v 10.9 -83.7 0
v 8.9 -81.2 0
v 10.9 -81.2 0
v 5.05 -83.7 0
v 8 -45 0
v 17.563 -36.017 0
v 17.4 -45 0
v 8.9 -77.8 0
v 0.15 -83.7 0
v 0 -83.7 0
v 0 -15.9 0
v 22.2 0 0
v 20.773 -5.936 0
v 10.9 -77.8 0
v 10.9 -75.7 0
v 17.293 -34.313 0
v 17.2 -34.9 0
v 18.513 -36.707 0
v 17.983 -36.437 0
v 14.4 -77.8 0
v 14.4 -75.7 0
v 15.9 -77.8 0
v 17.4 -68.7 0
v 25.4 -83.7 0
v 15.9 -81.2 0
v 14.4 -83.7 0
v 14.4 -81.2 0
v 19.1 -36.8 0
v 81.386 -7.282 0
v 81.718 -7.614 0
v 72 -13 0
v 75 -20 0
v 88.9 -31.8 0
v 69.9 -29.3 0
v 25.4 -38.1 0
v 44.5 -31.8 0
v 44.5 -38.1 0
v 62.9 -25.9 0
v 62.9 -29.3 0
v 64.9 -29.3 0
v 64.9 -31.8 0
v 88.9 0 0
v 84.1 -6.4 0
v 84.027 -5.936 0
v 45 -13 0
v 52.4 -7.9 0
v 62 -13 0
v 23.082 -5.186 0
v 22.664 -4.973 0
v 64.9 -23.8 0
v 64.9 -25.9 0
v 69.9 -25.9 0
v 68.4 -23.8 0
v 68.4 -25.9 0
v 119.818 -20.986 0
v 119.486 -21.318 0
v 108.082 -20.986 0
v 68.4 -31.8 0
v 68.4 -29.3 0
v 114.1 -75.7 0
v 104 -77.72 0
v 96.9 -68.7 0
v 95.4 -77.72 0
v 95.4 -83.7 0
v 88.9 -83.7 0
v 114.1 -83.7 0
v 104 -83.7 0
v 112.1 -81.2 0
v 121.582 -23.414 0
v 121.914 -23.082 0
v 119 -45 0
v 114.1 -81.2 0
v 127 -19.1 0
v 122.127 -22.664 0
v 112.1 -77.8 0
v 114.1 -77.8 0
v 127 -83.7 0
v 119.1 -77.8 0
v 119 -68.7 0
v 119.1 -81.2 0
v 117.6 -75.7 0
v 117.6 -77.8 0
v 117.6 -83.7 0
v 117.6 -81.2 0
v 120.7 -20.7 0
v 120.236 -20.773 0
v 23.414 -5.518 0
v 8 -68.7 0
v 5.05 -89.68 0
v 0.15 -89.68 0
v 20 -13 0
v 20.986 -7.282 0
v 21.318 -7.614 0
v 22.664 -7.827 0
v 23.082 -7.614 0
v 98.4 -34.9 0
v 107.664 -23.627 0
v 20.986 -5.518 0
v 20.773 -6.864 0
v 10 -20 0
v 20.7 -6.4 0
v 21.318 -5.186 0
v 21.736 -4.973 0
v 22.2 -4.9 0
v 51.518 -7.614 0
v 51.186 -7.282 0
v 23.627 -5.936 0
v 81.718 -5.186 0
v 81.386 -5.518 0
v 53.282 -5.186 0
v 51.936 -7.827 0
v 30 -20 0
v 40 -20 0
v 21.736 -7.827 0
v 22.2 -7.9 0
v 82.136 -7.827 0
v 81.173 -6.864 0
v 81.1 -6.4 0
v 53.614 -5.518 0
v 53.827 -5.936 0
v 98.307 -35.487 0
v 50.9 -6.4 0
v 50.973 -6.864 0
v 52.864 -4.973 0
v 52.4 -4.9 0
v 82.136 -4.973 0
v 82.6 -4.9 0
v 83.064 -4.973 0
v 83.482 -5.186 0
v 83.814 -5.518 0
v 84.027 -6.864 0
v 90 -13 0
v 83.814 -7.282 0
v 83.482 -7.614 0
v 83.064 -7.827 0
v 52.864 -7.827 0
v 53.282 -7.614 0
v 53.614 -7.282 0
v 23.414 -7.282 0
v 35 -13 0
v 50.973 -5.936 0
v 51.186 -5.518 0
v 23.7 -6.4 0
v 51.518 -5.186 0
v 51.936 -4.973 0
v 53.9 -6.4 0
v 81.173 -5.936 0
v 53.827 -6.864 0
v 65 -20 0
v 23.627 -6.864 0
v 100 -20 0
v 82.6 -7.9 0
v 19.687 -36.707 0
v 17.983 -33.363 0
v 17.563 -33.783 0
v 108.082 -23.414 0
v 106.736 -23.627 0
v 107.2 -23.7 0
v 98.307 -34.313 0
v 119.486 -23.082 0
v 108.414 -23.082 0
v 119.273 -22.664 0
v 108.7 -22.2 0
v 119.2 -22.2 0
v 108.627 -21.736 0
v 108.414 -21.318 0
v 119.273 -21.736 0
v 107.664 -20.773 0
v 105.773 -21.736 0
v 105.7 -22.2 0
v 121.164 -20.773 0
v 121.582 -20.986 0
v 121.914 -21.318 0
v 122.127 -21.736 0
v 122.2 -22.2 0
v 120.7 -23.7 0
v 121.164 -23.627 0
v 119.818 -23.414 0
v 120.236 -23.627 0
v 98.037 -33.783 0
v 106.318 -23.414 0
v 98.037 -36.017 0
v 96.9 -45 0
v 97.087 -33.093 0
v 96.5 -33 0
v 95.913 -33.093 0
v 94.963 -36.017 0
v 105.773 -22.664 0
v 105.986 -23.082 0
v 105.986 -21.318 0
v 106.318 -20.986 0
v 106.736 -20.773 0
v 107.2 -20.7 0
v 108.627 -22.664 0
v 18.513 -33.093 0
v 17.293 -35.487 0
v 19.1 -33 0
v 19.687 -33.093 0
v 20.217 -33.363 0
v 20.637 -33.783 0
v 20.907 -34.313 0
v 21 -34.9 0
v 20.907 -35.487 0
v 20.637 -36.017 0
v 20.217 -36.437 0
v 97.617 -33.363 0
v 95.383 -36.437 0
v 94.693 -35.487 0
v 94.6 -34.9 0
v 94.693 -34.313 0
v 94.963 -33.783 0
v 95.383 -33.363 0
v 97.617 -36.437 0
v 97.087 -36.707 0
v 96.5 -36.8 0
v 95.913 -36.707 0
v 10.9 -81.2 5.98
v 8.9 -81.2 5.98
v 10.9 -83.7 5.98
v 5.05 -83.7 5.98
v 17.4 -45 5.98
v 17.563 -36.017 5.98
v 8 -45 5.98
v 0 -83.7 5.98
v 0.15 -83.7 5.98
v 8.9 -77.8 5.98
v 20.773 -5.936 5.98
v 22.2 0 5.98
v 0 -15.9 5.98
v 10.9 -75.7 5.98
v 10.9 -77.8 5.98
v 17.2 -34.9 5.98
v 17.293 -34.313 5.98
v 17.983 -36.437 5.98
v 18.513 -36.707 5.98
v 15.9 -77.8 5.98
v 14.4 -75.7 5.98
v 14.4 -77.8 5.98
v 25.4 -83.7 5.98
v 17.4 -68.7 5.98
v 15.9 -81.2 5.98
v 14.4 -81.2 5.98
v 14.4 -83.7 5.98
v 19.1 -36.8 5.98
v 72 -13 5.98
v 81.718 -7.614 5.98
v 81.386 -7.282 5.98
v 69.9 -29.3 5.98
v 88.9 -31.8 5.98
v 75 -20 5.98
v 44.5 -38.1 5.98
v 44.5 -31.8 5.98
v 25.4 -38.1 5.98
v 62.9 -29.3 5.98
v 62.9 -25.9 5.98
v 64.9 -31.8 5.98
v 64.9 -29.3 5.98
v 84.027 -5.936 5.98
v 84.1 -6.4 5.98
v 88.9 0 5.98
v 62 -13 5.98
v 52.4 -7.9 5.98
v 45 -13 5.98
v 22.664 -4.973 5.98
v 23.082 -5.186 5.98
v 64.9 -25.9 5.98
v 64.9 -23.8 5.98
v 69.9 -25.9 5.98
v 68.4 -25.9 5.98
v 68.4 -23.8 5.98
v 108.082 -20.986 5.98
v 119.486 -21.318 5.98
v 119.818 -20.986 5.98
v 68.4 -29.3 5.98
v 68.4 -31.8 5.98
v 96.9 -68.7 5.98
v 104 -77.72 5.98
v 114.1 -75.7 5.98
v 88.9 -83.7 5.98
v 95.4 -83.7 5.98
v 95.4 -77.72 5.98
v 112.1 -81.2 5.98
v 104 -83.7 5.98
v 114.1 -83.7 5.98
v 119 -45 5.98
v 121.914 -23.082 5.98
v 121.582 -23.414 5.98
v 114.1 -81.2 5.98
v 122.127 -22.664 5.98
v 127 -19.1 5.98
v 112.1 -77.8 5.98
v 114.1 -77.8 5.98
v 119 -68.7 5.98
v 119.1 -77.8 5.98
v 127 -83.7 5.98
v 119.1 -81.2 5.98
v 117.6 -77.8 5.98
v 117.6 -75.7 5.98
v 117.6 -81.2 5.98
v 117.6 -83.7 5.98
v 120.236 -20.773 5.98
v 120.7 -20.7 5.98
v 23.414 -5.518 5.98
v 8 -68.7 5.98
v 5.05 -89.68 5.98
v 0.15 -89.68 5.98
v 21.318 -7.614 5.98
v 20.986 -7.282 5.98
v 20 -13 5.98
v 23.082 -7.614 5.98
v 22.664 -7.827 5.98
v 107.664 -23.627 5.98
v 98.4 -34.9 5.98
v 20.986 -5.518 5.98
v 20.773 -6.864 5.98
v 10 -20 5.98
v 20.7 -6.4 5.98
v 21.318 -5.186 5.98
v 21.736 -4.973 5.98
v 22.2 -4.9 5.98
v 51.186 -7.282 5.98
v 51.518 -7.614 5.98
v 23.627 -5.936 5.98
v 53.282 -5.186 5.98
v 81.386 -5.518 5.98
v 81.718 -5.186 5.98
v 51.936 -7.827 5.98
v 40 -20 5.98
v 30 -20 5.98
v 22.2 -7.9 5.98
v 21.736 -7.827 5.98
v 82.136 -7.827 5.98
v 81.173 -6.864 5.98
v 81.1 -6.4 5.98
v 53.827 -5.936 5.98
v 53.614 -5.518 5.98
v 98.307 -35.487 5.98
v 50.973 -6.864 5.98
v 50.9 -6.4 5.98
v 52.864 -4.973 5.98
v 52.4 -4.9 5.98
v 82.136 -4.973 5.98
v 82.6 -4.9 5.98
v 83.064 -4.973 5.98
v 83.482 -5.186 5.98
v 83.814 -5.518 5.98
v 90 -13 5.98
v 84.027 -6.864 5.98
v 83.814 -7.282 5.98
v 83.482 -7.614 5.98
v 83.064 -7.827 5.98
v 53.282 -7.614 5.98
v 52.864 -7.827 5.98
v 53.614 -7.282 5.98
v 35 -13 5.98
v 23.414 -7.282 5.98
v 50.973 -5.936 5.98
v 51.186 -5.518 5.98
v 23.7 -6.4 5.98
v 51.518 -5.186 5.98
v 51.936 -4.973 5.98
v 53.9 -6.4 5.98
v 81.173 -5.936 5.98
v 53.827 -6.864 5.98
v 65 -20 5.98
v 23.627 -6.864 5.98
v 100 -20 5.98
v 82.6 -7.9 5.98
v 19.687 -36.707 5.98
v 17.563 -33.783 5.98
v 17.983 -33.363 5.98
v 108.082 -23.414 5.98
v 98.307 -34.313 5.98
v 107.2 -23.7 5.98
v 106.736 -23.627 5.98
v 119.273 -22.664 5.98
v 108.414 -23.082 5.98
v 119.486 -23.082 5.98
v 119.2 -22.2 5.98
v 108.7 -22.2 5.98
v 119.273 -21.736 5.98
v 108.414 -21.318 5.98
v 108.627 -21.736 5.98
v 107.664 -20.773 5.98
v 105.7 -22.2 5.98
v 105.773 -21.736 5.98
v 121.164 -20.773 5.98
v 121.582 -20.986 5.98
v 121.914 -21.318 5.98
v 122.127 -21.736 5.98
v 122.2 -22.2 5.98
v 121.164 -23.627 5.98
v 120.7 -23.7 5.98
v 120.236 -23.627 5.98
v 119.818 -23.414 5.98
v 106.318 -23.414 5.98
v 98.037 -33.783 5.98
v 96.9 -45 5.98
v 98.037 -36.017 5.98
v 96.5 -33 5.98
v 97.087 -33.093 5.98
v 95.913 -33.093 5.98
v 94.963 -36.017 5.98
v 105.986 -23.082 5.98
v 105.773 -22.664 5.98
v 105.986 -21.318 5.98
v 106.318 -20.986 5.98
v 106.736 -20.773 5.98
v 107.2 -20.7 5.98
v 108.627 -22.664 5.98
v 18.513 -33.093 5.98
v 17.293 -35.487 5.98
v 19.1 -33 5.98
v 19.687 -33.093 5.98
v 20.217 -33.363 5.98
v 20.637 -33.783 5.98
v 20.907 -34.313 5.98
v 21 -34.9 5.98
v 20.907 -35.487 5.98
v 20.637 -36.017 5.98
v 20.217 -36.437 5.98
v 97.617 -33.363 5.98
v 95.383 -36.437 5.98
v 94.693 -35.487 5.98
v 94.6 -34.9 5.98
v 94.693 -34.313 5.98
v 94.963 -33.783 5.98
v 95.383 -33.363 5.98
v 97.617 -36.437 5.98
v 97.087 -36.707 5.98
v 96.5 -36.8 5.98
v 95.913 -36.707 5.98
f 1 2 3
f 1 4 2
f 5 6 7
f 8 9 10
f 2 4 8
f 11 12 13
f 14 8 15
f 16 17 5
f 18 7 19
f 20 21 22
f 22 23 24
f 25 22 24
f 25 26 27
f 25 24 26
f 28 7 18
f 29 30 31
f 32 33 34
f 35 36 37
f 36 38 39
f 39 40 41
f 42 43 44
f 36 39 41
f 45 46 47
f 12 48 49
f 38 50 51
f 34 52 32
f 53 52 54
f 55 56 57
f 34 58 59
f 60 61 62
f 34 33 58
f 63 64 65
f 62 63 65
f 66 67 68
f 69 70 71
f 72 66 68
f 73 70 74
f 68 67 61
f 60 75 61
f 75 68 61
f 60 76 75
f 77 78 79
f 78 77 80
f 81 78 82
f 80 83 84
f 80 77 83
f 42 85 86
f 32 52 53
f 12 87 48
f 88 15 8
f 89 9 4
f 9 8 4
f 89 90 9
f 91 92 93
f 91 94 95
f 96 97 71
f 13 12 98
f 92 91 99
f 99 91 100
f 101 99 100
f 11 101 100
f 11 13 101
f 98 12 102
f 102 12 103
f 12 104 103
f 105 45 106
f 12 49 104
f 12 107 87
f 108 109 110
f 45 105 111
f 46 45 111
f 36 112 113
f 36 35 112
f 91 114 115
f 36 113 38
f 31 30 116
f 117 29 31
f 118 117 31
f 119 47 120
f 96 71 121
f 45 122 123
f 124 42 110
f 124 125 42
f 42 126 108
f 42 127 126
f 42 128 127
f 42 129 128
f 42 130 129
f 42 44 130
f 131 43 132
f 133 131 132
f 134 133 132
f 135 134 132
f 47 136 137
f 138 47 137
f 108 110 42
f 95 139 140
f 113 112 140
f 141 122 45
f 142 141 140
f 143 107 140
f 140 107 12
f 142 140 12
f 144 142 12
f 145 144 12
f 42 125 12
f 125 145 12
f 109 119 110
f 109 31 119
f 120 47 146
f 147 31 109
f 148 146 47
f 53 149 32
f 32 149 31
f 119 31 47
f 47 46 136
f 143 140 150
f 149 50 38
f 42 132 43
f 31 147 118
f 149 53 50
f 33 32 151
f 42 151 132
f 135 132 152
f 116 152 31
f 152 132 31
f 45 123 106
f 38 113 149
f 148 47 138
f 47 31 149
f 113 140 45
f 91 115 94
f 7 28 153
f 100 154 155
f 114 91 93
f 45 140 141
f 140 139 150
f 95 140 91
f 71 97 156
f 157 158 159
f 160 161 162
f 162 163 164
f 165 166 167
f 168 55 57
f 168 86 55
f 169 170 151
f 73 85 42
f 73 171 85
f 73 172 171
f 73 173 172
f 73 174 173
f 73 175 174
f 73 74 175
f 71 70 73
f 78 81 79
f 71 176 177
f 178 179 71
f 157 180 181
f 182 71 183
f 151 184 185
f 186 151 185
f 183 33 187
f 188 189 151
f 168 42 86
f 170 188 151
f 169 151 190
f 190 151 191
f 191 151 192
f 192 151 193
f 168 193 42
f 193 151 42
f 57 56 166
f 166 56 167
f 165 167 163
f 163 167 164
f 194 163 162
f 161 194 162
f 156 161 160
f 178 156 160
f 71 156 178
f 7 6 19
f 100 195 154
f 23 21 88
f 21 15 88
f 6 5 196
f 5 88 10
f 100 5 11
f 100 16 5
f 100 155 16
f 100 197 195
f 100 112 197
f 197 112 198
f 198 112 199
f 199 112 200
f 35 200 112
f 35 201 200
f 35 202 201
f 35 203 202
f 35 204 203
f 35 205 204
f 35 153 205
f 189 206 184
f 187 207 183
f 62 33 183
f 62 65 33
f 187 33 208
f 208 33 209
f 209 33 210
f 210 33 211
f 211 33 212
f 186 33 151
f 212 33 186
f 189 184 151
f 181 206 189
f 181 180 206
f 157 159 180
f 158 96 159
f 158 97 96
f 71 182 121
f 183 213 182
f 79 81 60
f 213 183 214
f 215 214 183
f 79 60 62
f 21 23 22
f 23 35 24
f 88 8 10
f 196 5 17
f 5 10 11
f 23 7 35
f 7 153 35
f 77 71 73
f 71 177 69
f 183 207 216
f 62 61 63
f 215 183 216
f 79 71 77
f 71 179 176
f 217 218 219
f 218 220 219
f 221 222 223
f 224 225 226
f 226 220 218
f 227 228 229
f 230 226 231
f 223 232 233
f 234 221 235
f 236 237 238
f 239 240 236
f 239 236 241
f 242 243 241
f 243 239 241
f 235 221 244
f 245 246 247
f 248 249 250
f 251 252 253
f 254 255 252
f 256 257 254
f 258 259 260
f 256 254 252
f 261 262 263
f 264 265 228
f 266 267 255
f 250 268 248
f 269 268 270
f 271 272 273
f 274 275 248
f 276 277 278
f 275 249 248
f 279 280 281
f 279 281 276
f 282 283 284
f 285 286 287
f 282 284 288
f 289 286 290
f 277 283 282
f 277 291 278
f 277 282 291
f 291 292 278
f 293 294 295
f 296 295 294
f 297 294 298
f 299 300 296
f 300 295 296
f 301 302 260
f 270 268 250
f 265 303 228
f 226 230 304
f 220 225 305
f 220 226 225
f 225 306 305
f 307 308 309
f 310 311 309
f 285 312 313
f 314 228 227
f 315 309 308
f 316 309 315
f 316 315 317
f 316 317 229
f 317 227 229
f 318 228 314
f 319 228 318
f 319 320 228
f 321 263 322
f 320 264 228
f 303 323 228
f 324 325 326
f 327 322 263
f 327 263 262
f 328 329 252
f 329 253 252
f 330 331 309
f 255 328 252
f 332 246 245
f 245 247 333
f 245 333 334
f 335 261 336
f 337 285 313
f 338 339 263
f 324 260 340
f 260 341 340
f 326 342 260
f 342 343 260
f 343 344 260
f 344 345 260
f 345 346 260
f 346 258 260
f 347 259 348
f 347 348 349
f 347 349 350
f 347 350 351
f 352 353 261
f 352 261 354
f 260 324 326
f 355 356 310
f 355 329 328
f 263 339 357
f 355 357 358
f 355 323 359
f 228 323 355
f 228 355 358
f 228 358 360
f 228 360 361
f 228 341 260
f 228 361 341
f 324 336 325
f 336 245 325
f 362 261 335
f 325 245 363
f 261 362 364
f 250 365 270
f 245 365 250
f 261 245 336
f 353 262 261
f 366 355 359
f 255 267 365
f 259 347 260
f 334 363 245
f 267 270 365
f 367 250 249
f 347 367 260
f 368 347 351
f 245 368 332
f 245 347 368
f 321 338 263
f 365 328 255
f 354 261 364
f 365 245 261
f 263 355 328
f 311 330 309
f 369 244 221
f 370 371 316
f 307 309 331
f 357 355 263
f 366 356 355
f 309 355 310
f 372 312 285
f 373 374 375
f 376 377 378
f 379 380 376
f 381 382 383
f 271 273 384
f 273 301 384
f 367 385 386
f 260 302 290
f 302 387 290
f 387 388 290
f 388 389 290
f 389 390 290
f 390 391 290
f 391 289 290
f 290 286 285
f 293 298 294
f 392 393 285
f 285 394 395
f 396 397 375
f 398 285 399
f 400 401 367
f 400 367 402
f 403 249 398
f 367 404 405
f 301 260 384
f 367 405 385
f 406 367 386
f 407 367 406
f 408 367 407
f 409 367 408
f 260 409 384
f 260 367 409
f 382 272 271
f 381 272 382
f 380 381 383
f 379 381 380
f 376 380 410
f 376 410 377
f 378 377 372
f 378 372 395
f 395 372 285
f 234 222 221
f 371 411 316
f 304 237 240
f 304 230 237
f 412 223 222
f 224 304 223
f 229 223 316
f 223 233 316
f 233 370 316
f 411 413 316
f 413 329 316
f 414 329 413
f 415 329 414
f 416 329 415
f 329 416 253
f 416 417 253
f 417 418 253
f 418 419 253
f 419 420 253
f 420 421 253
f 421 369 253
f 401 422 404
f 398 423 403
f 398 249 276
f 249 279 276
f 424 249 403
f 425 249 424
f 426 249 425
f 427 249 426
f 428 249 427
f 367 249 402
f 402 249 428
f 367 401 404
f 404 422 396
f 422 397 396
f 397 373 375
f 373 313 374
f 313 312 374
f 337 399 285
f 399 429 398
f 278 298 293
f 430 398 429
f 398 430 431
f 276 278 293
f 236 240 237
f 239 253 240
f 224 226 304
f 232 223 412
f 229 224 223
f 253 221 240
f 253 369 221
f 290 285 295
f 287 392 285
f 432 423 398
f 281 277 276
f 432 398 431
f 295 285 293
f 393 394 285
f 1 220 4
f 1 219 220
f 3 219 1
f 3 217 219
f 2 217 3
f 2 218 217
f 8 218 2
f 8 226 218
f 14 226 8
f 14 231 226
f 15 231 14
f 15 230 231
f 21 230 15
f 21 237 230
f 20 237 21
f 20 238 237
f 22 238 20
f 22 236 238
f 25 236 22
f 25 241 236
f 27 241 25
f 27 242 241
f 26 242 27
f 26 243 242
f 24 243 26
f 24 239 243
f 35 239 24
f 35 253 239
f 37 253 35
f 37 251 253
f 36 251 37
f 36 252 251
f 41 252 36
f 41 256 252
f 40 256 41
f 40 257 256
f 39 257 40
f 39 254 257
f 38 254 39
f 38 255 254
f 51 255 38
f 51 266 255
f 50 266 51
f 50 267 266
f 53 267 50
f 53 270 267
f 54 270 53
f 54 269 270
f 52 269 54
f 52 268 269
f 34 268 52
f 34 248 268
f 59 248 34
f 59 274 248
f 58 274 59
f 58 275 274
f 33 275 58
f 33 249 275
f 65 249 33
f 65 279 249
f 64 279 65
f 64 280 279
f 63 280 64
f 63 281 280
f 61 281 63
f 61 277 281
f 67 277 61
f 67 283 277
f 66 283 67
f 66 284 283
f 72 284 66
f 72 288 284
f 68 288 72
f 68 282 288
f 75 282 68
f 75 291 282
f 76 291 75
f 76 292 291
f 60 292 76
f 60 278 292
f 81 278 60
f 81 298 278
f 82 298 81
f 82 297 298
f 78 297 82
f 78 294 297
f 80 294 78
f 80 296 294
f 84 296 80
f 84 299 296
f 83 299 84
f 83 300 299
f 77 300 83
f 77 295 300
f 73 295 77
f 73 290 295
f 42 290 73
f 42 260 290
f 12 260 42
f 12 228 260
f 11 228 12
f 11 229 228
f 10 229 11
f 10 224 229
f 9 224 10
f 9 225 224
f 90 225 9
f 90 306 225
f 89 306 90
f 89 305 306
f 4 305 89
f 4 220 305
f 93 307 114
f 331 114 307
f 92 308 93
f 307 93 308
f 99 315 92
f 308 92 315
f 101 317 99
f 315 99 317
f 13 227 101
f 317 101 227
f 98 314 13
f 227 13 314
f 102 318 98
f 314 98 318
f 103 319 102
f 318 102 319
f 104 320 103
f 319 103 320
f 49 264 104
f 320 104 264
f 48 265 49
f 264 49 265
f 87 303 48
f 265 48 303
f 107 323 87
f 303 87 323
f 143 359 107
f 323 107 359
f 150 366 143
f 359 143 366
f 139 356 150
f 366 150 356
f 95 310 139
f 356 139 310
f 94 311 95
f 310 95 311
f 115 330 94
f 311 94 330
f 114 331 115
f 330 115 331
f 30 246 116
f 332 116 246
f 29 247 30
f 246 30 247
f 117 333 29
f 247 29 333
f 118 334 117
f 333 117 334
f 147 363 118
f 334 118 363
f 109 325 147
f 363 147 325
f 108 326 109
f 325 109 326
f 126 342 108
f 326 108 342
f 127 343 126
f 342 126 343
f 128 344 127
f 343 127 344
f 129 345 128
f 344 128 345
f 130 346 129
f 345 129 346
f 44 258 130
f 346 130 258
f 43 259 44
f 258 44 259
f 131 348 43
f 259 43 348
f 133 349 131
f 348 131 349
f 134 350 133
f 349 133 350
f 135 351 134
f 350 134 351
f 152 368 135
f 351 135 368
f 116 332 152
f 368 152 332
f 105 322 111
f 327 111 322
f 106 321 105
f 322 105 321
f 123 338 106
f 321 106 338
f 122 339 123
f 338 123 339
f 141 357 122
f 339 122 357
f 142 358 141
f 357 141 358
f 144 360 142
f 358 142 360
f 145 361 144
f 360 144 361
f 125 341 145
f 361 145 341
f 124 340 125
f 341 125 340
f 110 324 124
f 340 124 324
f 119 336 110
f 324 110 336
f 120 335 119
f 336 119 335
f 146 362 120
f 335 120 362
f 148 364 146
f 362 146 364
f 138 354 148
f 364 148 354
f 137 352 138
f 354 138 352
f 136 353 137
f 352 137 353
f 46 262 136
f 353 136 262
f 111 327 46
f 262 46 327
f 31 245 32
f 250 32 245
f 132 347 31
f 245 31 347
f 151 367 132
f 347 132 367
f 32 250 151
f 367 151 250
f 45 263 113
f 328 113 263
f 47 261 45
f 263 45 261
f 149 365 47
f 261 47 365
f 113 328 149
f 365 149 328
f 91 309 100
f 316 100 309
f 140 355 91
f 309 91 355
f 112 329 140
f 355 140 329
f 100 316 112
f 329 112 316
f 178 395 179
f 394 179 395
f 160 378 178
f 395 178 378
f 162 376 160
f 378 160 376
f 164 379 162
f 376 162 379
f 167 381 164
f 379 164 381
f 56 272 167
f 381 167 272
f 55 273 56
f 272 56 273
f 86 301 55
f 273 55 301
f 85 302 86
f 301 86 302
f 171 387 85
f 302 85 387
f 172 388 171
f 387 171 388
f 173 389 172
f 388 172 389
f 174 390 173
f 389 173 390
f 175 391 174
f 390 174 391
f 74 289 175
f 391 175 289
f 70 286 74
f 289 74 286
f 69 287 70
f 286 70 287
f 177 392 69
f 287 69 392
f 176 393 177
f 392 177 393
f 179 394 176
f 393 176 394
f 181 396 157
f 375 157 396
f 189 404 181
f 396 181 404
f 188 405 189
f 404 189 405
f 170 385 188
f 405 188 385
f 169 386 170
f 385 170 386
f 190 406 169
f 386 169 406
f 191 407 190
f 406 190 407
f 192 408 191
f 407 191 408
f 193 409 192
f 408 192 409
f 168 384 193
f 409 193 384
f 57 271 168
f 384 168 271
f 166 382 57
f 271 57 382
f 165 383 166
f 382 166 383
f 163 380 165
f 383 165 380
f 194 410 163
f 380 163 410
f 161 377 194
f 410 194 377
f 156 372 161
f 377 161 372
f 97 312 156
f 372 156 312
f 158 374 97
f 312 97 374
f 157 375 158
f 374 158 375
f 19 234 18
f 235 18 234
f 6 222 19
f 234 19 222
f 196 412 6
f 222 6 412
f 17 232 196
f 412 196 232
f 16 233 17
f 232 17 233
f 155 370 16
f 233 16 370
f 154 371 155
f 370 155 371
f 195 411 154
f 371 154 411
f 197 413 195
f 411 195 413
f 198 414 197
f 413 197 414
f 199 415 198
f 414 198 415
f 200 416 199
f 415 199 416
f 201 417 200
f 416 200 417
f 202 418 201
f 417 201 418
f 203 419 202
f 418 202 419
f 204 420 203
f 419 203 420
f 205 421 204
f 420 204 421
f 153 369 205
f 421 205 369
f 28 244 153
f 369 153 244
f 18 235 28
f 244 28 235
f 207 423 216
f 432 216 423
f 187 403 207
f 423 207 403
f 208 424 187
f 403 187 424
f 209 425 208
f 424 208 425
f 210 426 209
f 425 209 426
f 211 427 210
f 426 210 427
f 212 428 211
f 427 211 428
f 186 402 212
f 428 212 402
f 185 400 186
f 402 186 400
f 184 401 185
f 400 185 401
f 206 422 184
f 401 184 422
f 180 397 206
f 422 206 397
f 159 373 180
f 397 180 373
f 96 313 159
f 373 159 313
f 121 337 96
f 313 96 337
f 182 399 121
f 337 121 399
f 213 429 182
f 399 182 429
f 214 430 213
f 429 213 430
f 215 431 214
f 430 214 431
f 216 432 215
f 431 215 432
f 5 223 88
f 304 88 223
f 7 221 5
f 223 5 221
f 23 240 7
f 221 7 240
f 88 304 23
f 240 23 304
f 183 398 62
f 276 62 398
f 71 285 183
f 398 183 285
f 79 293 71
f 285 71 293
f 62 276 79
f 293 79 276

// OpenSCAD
// rightSide: The right vertical piece of the robot

/* Except for the placement of one notch, this is identical
 * to leftSide. The trick is the linear_extrude function at
 * the end has a "mirror" function that does a reverse image
 * of the original (left) side.
 *
 * All comments have been removed from this file, except to
 * illustrate the one change. Look to leftSide for comments.
 */

yMax=83.7;
x1=25.4;
x2=44.5; 
x3=88.9; 
xMax=127; 
notchDepth=4.9; 
th=5.98;  
bh = 1.9; 
wt = 1.5; 

module botRightSide(){
  difference(){
    union(){
      polygon([[0,15.9],[0,yMax],[x1,yMax],[x1,0],[22.2,0]],
              [[0,1,2,3,4]]);
//THIS IS THE ONE CHANGE
      translate([0.15,yMax]) square([notchDepth,th]);
      translate([x1,0]) square([x2-x1,38.1]);
      translate([x2,0]) square([x3-x2,31.8]);
      polygon([[x3,0],[x3,yMax],[xMax,yMax],[xMax,19.1]],
              [[0,1,2,3]]);
    } 
    translate([19.1,34.9]) circle(r=bh, $fn=20);
    translate([96.5,34.9]) circle(r=bh, $fn=20);
    translate([22.2, 6.4]) circle(r=wt, $fn=20);
    translate([52.4, 6.4]) circle(r=wt, $fn=20);
    translate([82.6, 6.4]) circle(r=wt, $fn=20);
    translate([120.7,22.2])circle(r=wt, $fn=20);
    translate([120.7-13.5,22.2])circle(r=wt, $fn=20);
    translate([10.9,yMax]) t_down();
    translate([114.1,yMax]) t_down();
    translate([64.9,31.8])  t_down();
    translate([95.4,yMax-th]) square([8.6,th]);
    polygon([[20,13],[10,20],[30,20],[35,13]],[[0,1,2,3]]);
    polygon([[45,13],[40,20],[65,20],[62,13]],[[0,1,2,3]]);
    polygon([[72,13],[75,20],[100,20],[90,13]],[[0,1,2,3]]);
    polygon([[x3+8,45],[x3+8,yMax-15],
             [xMax-8,yMax-15],[xMax-8,45]],[[0,1,2,3]]);
    polygon([[8,45],[8,yMax-15],
             [x1-8,yMax-15],[x1-8,45]],[[0,1,2,3]]);
  }
}

linear_extrude(height=th) mirror([0,50,0]) botRightSide();

module t_down(){
  union(){
    translate([0,-8]) square([3.5,8]);
    translate([-2,-5.9]) square([7,3.4]);
  }
}
